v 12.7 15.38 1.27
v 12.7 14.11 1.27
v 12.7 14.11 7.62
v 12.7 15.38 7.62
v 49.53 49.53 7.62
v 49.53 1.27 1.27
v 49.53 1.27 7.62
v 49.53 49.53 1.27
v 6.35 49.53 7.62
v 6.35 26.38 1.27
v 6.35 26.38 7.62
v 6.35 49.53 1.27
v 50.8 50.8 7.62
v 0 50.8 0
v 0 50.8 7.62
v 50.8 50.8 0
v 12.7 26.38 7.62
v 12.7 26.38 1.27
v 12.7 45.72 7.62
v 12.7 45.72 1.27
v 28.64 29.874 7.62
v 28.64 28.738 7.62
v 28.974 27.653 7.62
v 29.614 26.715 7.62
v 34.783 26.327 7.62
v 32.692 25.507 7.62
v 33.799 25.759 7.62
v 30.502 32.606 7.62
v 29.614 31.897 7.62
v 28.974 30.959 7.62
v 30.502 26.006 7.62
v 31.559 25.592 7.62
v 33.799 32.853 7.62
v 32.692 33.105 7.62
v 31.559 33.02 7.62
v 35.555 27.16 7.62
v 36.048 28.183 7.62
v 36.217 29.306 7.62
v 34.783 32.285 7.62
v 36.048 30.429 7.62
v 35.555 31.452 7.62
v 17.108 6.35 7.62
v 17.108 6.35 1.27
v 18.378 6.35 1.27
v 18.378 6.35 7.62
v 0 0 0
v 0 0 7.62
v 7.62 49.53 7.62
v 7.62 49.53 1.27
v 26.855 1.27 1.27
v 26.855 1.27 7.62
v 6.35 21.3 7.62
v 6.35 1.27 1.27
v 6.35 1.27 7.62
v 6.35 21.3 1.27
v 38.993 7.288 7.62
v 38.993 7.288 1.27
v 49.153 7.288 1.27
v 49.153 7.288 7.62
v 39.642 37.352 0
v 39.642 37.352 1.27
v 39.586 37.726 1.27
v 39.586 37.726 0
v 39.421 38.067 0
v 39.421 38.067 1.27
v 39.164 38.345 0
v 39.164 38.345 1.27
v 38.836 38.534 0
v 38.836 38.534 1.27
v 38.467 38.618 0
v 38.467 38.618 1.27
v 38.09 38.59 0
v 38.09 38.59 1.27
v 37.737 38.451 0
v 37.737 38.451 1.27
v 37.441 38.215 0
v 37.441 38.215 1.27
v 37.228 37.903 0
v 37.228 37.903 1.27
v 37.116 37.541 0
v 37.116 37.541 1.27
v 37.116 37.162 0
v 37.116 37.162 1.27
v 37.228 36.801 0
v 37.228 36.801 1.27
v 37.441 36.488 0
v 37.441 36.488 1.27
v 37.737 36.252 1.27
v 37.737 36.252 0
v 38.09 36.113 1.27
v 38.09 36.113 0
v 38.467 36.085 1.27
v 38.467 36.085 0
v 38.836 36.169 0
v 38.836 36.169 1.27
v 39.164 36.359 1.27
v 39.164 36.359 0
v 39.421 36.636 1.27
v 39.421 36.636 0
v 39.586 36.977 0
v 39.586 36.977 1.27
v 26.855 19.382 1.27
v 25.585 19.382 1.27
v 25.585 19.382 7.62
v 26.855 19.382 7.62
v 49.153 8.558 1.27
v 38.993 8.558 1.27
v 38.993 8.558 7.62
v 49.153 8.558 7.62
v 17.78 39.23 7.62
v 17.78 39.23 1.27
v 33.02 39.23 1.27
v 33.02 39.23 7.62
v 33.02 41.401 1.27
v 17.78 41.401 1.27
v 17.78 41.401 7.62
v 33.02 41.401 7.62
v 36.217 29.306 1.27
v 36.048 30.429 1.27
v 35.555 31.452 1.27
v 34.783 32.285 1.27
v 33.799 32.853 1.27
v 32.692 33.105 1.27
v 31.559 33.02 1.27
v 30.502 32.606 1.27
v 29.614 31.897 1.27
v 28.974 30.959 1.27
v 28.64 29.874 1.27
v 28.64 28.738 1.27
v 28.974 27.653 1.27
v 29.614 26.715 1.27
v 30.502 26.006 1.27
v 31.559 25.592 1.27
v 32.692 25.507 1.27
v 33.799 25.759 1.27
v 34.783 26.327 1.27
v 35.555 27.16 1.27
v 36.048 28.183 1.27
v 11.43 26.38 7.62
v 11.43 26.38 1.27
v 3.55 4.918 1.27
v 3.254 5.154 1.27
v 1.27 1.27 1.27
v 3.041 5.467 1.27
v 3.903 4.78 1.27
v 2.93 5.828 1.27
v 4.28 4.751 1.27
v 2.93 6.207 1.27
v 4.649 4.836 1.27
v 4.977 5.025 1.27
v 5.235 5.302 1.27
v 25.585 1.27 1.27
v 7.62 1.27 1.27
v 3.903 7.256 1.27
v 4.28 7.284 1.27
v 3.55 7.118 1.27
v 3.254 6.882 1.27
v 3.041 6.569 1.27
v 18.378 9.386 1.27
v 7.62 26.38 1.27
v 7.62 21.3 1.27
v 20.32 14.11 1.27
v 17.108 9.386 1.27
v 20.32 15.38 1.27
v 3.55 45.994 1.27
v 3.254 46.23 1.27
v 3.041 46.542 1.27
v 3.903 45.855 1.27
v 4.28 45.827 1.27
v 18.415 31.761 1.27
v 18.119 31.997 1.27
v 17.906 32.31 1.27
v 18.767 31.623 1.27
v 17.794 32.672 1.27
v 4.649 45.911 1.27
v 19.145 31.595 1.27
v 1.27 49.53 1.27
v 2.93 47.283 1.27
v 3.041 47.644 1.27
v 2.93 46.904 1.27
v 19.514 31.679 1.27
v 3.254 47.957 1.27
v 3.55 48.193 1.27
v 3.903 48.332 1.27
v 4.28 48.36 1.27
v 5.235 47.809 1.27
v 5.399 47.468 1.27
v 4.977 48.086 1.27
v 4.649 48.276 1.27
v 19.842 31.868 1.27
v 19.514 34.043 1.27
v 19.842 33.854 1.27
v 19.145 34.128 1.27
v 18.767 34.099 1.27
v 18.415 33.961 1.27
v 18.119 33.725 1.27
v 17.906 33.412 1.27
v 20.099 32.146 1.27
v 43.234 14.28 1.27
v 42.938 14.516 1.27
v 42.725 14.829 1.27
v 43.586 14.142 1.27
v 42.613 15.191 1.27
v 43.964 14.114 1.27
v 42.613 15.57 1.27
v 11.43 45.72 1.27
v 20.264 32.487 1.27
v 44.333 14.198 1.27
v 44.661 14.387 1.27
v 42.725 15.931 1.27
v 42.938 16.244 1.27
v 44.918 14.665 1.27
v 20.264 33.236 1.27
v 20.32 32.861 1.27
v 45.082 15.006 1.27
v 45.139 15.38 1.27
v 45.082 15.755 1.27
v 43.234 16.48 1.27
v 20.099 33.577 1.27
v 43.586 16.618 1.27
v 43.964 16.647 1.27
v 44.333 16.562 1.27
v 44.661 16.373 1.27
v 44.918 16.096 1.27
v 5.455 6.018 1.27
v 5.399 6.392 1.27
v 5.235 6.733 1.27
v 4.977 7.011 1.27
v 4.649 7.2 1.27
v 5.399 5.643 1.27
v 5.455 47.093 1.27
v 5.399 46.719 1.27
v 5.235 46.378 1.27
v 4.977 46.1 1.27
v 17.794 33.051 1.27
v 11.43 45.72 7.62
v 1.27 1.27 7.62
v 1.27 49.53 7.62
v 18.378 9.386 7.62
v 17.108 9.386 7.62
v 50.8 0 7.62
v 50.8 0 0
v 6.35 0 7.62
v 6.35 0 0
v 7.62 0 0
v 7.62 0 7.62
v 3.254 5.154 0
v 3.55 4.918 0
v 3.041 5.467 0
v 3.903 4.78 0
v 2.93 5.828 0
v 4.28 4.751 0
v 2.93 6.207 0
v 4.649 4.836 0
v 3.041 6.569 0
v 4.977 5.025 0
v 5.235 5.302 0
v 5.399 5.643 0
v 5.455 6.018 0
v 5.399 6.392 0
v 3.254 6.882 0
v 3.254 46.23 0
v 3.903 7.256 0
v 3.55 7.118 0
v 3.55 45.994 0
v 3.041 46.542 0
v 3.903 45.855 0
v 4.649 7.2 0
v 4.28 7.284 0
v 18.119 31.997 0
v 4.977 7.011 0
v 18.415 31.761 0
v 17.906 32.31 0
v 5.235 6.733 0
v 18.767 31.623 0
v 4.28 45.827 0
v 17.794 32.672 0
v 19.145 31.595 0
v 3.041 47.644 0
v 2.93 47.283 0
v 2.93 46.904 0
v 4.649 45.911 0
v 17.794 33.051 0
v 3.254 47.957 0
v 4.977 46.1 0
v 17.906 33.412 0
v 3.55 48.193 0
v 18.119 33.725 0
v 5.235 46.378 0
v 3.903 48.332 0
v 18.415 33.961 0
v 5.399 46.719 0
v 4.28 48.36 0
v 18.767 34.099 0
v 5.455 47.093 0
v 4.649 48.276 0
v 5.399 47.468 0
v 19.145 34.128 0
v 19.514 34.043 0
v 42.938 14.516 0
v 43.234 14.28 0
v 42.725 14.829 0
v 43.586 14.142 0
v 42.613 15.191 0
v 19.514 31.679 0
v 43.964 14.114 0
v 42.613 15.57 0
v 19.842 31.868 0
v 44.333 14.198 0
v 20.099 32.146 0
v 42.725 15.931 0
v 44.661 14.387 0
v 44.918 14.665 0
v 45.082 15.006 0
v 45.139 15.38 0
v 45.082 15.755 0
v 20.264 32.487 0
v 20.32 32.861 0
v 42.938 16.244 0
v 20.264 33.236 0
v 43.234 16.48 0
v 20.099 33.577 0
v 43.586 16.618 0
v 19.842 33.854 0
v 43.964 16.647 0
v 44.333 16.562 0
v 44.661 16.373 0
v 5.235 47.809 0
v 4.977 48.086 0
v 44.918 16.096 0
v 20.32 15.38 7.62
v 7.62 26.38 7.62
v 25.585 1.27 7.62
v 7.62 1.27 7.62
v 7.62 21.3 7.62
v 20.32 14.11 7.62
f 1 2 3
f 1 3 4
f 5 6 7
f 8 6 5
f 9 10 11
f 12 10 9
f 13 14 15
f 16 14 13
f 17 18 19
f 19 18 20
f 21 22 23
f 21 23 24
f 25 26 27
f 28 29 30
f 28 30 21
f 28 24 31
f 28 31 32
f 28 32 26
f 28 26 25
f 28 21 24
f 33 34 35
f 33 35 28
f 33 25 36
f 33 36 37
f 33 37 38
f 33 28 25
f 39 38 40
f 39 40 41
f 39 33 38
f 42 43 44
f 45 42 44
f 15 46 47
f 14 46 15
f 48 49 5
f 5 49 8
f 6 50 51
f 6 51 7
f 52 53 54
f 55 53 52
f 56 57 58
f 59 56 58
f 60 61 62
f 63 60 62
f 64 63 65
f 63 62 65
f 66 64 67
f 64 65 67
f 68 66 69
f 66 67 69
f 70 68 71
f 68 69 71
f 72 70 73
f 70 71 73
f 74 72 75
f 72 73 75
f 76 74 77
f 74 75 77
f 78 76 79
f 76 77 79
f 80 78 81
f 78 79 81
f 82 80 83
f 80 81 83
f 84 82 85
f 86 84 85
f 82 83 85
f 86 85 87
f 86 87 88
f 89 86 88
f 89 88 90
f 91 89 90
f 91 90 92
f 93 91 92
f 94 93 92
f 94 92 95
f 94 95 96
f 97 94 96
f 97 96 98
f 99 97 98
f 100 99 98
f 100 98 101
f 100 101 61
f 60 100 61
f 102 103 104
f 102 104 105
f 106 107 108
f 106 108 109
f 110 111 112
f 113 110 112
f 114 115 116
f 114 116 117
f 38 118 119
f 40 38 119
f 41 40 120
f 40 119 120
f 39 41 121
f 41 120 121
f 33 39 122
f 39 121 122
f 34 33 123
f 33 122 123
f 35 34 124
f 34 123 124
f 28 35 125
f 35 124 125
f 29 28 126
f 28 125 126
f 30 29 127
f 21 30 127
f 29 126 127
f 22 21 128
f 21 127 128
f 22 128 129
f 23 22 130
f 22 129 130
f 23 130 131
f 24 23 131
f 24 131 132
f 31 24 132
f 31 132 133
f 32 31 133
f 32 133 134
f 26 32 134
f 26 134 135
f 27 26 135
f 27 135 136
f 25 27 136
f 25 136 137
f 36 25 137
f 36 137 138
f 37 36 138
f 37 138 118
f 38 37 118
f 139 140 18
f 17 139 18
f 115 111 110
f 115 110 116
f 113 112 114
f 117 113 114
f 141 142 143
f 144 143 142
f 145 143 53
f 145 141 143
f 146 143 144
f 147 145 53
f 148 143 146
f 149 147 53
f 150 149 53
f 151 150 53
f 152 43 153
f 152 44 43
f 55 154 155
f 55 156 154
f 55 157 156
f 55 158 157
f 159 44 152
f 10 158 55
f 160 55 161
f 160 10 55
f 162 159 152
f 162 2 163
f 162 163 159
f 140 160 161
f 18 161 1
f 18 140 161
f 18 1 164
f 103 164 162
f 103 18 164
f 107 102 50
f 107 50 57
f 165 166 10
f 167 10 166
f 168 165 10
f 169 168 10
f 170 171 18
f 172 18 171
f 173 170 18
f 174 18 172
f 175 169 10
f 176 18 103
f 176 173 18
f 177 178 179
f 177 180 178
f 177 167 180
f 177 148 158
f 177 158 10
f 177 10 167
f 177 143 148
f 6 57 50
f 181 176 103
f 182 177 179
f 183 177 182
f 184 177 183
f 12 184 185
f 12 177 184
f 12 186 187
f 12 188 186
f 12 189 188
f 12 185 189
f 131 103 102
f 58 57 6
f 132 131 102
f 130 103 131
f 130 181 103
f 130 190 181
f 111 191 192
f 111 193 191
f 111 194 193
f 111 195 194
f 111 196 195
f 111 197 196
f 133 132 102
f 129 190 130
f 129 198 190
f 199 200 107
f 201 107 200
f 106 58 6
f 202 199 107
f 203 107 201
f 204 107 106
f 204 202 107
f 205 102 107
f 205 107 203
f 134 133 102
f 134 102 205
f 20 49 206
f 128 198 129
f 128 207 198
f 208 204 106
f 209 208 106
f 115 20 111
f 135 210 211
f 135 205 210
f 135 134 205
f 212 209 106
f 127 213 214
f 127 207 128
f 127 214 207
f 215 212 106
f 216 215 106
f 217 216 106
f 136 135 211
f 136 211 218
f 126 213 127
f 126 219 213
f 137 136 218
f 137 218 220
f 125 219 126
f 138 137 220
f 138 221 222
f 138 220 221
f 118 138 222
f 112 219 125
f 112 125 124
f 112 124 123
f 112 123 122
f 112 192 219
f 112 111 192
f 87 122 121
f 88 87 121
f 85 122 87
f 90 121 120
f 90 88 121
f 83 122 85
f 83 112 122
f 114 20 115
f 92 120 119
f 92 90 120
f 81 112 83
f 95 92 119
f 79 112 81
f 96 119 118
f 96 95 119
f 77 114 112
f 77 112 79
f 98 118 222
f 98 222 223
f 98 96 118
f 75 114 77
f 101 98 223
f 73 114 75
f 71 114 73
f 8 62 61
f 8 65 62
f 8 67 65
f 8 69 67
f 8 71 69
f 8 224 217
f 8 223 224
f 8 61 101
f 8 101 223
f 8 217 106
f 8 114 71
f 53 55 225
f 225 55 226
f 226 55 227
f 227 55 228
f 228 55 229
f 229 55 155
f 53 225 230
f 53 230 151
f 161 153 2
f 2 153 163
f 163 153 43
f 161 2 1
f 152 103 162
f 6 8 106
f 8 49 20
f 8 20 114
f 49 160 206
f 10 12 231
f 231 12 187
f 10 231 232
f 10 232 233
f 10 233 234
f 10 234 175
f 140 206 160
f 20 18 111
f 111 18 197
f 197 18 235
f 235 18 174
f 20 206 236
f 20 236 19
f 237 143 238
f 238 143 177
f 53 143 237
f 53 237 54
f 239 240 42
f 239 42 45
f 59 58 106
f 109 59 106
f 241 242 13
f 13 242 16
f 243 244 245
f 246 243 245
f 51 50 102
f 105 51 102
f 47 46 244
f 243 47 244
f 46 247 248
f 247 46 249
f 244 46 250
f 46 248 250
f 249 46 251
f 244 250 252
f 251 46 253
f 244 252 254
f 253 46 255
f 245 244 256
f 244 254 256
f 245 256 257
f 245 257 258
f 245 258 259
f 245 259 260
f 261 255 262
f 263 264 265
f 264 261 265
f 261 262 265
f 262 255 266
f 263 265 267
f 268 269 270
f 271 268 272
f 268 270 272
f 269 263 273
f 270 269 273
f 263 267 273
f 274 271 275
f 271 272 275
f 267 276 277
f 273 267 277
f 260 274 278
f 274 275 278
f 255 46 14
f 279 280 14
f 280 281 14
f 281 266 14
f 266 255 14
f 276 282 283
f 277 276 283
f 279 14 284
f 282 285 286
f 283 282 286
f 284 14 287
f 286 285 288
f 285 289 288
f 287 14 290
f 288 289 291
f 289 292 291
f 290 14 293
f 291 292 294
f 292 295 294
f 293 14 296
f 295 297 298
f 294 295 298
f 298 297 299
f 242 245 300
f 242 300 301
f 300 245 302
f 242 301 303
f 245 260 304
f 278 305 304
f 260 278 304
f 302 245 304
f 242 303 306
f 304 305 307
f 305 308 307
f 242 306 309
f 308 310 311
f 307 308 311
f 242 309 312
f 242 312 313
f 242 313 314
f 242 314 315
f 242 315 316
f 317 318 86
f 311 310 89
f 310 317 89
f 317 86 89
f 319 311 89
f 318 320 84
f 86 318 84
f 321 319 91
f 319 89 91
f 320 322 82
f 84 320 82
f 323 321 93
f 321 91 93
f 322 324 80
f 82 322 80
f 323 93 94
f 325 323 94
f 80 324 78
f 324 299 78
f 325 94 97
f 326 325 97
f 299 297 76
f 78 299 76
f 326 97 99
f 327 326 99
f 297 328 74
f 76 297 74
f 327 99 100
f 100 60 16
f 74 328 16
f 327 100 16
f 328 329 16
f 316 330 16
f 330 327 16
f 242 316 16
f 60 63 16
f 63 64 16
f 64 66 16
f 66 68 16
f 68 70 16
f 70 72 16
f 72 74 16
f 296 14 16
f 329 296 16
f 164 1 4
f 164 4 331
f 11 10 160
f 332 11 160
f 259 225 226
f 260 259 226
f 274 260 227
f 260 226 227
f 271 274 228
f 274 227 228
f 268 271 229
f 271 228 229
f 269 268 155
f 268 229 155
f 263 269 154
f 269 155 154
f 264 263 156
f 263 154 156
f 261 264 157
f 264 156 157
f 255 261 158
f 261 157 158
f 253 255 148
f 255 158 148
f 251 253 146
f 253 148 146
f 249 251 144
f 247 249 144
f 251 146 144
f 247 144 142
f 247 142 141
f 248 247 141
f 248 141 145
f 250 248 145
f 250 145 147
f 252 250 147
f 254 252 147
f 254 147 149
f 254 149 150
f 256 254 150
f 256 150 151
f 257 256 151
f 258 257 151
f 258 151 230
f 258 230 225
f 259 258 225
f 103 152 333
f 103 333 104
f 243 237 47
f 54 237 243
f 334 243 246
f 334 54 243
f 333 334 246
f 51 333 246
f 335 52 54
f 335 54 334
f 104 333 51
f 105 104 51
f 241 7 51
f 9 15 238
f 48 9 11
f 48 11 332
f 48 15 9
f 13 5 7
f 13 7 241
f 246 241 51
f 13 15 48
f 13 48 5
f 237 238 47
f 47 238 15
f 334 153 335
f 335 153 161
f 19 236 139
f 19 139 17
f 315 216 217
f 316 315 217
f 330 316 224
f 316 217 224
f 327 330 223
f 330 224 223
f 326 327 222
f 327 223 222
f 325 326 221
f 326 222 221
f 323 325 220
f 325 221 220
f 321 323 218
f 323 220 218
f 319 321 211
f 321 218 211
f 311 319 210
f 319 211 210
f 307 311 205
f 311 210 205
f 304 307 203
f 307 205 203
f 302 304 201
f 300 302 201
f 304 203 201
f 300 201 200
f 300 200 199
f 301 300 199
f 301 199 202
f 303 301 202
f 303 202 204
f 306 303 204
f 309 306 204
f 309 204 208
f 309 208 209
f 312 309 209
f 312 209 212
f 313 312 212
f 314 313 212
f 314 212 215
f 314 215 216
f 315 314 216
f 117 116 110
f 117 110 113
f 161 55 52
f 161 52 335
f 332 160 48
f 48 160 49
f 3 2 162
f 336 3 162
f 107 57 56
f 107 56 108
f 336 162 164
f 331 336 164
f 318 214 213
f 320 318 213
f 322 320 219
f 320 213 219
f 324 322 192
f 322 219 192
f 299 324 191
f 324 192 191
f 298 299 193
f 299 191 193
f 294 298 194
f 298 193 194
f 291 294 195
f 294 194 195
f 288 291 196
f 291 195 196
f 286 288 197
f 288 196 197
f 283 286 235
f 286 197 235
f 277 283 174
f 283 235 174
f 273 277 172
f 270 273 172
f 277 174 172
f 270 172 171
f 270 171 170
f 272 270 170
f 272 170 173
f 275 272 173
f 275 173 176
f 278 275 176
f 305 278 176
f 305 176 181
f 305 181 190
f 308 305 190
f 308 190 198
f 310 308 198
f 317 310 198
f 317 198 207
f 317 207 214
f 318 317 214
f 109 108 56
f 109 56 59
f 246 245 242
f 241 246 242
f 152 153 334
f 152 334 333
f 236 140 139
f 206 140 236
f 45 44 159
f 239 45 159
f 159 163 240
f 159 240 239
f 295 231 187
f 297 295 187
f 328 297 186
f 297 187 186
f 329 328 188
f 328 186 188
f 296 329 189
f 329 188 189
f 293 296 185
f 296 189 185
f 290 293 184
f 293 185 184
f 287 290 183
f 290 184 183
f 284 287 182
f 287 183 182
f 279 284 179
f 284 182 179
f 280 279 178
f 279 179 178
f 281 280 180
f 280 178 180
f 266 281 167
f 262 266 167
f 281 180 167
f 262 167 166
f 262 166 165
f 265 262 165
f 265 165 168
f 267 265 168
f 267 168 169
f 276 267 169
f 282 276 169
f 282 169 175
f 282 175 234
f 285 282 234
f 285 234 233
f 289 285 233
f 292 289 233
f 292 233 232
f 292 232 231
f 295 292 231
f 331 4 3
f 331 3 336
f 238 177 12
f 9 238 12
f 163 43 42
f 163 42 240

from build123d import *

# Parameters (mm, degrees)
F0_W      = 50.8
F0_H      = 50.8
F1_DEPTH  = 7.62
F2_T      = -1.27
F3_W      = 1.27
F3_H      = 21.299569
F3_H_2    = 24.274384
F3_H_3    = 19.340431
F4_DEPTH  = 7.62
F5_W      = 10.16
F5_H      = 1.27
F5_W_2    = 15.24
F5_H_2    = 2.170816
F5_W_3    = 7.62
F5_R      = 3.81
F5_W_4    = 1.27
F5_H_3    = 19.382268
F6_DEPTH  = 7.62
F7_R      = 0.635
F8_DEPTH  = 25.4
F9_R      = 1.27
F10_DEPTH = 25.4
F11_R     = 1.27
F12_DEPTH = 25.4
F13_R     = 1.27
F14_DEPTH = 25.4
F15_DEPTH = 25.4
F16_W     = 1.27
F16_H     = 3.036126
F17_DEPTH = 7.62


with BuildPart() as f1:
    # F0 (on Top) → F1 (new body)
    with BuildSketch(Plane.XY):
        with Locations((25.4, 25.4)):
            Rectangle(F0_W, F0_H)
    extrude(amount=F1_DEPTH)

    # F2
    f2_openings = [f1.faces().sort_by_distance(p)[0] for p in [
        (25.4, 25.4, 7.62),
    ]]
    offset(amount=F2_T, openings=f2_openings)

    # F3 (on Top) → F4 (join)
    with BuildSketch(Plane.XY):
        with Locations((6.985, 10.649784)):
            Rectangle(F3_W, F3_H)
        with Locations((6.985, 38.516761)):
            Rectangle(F3_W, F3_H_2)
        with Locations((12.065, 36.049785)):
            Rectangle(F3_W, F3_H_3)
    extrude(amount=F4_DEPTH)

    # F5 (on Top) → F6 (join)
    with BuildSketch(Plane.XY):
        with Locations((44.073429, 7.922732)):
            Rectangle(F5_W, F5_H)
        with Locations((25.4, 40.315118)):
            Rectangle(F5_W_2, F5_H_2)
        with Locations((16.51, 14.74529)):
            Rectangle(F5_W_3, F5_H)
        with Locations((32.407153, 29.305989)):
            Circle(F5_R)
        with Locations((26.219592, 9.691134)):
            Rectangle(F5_W_4, F5_H_3)
    extrude(amount=F6_DEPTH)

    # F7 (on Top) → F8 (cut)
    with BuildSketch(Plane.XY):
        with Locations((3.863793, 5.102679)):
            Circle(F7_R)
    extrude(amount=-F8_DEPTH, mode=Mode.SUBTRACT)

    # F9 (on face) → F10 (cut)
    with BuildSketch(Plane.XY.offset(1.27)):
        with Locations((43.868799, 15.38029)):
            Circle(F9_R)
    extrude(amount=-F10_DEPTH, mode=Mode.SUBTRACT)

    # F11 (on face) → F12 (cut)
    with BuildSketch(Plane.XY.offset(1.27)):
        with Locations((38.372144, 37.351608)):
            Circle(F11_R)
    extrude(amount=-F12_DEPTH, mode=Mode.SUBTRACT)

    # F13 (on face) → F14 (cut)
    with BuildSketch(Plane.XY.offset(1.27)):
        with Locations((19.05, 32.861251)):
            Circle(F13_R)
        with Locations((4.185437, 47.093425)):
            Circle(F13_R)
        with Locations((4.185437, 6.017732)):
            Circle(F13_R)
    extrude(amount=-F14_DEPTH, mode=Mode.SUBTRACT)

    # F13 (on face) → F15 (cut)
    with BuildSketch(Plane.XY.offset(1.27)):
        with Locations((19.05, 32.861251)):
            Circle(F13_R)
        with Locations((4.185437, 47.093425)):
            Circle(F13_R)
        with Locations((4.185437, 6.017732)):
            Circle(F13_R)
    extrude(amount=-F15_DEPTH, mode=Mode.SUBTRACT)

    # F16 (on Top) → F17 (join)
    with BuildSketch(Plane.XY):
        with Locations((17.742798, 7.868063)):
            Rectangle(F16_W, F16_H)
    extrude(amount=F17_DEPTH)


solid = f1.part
